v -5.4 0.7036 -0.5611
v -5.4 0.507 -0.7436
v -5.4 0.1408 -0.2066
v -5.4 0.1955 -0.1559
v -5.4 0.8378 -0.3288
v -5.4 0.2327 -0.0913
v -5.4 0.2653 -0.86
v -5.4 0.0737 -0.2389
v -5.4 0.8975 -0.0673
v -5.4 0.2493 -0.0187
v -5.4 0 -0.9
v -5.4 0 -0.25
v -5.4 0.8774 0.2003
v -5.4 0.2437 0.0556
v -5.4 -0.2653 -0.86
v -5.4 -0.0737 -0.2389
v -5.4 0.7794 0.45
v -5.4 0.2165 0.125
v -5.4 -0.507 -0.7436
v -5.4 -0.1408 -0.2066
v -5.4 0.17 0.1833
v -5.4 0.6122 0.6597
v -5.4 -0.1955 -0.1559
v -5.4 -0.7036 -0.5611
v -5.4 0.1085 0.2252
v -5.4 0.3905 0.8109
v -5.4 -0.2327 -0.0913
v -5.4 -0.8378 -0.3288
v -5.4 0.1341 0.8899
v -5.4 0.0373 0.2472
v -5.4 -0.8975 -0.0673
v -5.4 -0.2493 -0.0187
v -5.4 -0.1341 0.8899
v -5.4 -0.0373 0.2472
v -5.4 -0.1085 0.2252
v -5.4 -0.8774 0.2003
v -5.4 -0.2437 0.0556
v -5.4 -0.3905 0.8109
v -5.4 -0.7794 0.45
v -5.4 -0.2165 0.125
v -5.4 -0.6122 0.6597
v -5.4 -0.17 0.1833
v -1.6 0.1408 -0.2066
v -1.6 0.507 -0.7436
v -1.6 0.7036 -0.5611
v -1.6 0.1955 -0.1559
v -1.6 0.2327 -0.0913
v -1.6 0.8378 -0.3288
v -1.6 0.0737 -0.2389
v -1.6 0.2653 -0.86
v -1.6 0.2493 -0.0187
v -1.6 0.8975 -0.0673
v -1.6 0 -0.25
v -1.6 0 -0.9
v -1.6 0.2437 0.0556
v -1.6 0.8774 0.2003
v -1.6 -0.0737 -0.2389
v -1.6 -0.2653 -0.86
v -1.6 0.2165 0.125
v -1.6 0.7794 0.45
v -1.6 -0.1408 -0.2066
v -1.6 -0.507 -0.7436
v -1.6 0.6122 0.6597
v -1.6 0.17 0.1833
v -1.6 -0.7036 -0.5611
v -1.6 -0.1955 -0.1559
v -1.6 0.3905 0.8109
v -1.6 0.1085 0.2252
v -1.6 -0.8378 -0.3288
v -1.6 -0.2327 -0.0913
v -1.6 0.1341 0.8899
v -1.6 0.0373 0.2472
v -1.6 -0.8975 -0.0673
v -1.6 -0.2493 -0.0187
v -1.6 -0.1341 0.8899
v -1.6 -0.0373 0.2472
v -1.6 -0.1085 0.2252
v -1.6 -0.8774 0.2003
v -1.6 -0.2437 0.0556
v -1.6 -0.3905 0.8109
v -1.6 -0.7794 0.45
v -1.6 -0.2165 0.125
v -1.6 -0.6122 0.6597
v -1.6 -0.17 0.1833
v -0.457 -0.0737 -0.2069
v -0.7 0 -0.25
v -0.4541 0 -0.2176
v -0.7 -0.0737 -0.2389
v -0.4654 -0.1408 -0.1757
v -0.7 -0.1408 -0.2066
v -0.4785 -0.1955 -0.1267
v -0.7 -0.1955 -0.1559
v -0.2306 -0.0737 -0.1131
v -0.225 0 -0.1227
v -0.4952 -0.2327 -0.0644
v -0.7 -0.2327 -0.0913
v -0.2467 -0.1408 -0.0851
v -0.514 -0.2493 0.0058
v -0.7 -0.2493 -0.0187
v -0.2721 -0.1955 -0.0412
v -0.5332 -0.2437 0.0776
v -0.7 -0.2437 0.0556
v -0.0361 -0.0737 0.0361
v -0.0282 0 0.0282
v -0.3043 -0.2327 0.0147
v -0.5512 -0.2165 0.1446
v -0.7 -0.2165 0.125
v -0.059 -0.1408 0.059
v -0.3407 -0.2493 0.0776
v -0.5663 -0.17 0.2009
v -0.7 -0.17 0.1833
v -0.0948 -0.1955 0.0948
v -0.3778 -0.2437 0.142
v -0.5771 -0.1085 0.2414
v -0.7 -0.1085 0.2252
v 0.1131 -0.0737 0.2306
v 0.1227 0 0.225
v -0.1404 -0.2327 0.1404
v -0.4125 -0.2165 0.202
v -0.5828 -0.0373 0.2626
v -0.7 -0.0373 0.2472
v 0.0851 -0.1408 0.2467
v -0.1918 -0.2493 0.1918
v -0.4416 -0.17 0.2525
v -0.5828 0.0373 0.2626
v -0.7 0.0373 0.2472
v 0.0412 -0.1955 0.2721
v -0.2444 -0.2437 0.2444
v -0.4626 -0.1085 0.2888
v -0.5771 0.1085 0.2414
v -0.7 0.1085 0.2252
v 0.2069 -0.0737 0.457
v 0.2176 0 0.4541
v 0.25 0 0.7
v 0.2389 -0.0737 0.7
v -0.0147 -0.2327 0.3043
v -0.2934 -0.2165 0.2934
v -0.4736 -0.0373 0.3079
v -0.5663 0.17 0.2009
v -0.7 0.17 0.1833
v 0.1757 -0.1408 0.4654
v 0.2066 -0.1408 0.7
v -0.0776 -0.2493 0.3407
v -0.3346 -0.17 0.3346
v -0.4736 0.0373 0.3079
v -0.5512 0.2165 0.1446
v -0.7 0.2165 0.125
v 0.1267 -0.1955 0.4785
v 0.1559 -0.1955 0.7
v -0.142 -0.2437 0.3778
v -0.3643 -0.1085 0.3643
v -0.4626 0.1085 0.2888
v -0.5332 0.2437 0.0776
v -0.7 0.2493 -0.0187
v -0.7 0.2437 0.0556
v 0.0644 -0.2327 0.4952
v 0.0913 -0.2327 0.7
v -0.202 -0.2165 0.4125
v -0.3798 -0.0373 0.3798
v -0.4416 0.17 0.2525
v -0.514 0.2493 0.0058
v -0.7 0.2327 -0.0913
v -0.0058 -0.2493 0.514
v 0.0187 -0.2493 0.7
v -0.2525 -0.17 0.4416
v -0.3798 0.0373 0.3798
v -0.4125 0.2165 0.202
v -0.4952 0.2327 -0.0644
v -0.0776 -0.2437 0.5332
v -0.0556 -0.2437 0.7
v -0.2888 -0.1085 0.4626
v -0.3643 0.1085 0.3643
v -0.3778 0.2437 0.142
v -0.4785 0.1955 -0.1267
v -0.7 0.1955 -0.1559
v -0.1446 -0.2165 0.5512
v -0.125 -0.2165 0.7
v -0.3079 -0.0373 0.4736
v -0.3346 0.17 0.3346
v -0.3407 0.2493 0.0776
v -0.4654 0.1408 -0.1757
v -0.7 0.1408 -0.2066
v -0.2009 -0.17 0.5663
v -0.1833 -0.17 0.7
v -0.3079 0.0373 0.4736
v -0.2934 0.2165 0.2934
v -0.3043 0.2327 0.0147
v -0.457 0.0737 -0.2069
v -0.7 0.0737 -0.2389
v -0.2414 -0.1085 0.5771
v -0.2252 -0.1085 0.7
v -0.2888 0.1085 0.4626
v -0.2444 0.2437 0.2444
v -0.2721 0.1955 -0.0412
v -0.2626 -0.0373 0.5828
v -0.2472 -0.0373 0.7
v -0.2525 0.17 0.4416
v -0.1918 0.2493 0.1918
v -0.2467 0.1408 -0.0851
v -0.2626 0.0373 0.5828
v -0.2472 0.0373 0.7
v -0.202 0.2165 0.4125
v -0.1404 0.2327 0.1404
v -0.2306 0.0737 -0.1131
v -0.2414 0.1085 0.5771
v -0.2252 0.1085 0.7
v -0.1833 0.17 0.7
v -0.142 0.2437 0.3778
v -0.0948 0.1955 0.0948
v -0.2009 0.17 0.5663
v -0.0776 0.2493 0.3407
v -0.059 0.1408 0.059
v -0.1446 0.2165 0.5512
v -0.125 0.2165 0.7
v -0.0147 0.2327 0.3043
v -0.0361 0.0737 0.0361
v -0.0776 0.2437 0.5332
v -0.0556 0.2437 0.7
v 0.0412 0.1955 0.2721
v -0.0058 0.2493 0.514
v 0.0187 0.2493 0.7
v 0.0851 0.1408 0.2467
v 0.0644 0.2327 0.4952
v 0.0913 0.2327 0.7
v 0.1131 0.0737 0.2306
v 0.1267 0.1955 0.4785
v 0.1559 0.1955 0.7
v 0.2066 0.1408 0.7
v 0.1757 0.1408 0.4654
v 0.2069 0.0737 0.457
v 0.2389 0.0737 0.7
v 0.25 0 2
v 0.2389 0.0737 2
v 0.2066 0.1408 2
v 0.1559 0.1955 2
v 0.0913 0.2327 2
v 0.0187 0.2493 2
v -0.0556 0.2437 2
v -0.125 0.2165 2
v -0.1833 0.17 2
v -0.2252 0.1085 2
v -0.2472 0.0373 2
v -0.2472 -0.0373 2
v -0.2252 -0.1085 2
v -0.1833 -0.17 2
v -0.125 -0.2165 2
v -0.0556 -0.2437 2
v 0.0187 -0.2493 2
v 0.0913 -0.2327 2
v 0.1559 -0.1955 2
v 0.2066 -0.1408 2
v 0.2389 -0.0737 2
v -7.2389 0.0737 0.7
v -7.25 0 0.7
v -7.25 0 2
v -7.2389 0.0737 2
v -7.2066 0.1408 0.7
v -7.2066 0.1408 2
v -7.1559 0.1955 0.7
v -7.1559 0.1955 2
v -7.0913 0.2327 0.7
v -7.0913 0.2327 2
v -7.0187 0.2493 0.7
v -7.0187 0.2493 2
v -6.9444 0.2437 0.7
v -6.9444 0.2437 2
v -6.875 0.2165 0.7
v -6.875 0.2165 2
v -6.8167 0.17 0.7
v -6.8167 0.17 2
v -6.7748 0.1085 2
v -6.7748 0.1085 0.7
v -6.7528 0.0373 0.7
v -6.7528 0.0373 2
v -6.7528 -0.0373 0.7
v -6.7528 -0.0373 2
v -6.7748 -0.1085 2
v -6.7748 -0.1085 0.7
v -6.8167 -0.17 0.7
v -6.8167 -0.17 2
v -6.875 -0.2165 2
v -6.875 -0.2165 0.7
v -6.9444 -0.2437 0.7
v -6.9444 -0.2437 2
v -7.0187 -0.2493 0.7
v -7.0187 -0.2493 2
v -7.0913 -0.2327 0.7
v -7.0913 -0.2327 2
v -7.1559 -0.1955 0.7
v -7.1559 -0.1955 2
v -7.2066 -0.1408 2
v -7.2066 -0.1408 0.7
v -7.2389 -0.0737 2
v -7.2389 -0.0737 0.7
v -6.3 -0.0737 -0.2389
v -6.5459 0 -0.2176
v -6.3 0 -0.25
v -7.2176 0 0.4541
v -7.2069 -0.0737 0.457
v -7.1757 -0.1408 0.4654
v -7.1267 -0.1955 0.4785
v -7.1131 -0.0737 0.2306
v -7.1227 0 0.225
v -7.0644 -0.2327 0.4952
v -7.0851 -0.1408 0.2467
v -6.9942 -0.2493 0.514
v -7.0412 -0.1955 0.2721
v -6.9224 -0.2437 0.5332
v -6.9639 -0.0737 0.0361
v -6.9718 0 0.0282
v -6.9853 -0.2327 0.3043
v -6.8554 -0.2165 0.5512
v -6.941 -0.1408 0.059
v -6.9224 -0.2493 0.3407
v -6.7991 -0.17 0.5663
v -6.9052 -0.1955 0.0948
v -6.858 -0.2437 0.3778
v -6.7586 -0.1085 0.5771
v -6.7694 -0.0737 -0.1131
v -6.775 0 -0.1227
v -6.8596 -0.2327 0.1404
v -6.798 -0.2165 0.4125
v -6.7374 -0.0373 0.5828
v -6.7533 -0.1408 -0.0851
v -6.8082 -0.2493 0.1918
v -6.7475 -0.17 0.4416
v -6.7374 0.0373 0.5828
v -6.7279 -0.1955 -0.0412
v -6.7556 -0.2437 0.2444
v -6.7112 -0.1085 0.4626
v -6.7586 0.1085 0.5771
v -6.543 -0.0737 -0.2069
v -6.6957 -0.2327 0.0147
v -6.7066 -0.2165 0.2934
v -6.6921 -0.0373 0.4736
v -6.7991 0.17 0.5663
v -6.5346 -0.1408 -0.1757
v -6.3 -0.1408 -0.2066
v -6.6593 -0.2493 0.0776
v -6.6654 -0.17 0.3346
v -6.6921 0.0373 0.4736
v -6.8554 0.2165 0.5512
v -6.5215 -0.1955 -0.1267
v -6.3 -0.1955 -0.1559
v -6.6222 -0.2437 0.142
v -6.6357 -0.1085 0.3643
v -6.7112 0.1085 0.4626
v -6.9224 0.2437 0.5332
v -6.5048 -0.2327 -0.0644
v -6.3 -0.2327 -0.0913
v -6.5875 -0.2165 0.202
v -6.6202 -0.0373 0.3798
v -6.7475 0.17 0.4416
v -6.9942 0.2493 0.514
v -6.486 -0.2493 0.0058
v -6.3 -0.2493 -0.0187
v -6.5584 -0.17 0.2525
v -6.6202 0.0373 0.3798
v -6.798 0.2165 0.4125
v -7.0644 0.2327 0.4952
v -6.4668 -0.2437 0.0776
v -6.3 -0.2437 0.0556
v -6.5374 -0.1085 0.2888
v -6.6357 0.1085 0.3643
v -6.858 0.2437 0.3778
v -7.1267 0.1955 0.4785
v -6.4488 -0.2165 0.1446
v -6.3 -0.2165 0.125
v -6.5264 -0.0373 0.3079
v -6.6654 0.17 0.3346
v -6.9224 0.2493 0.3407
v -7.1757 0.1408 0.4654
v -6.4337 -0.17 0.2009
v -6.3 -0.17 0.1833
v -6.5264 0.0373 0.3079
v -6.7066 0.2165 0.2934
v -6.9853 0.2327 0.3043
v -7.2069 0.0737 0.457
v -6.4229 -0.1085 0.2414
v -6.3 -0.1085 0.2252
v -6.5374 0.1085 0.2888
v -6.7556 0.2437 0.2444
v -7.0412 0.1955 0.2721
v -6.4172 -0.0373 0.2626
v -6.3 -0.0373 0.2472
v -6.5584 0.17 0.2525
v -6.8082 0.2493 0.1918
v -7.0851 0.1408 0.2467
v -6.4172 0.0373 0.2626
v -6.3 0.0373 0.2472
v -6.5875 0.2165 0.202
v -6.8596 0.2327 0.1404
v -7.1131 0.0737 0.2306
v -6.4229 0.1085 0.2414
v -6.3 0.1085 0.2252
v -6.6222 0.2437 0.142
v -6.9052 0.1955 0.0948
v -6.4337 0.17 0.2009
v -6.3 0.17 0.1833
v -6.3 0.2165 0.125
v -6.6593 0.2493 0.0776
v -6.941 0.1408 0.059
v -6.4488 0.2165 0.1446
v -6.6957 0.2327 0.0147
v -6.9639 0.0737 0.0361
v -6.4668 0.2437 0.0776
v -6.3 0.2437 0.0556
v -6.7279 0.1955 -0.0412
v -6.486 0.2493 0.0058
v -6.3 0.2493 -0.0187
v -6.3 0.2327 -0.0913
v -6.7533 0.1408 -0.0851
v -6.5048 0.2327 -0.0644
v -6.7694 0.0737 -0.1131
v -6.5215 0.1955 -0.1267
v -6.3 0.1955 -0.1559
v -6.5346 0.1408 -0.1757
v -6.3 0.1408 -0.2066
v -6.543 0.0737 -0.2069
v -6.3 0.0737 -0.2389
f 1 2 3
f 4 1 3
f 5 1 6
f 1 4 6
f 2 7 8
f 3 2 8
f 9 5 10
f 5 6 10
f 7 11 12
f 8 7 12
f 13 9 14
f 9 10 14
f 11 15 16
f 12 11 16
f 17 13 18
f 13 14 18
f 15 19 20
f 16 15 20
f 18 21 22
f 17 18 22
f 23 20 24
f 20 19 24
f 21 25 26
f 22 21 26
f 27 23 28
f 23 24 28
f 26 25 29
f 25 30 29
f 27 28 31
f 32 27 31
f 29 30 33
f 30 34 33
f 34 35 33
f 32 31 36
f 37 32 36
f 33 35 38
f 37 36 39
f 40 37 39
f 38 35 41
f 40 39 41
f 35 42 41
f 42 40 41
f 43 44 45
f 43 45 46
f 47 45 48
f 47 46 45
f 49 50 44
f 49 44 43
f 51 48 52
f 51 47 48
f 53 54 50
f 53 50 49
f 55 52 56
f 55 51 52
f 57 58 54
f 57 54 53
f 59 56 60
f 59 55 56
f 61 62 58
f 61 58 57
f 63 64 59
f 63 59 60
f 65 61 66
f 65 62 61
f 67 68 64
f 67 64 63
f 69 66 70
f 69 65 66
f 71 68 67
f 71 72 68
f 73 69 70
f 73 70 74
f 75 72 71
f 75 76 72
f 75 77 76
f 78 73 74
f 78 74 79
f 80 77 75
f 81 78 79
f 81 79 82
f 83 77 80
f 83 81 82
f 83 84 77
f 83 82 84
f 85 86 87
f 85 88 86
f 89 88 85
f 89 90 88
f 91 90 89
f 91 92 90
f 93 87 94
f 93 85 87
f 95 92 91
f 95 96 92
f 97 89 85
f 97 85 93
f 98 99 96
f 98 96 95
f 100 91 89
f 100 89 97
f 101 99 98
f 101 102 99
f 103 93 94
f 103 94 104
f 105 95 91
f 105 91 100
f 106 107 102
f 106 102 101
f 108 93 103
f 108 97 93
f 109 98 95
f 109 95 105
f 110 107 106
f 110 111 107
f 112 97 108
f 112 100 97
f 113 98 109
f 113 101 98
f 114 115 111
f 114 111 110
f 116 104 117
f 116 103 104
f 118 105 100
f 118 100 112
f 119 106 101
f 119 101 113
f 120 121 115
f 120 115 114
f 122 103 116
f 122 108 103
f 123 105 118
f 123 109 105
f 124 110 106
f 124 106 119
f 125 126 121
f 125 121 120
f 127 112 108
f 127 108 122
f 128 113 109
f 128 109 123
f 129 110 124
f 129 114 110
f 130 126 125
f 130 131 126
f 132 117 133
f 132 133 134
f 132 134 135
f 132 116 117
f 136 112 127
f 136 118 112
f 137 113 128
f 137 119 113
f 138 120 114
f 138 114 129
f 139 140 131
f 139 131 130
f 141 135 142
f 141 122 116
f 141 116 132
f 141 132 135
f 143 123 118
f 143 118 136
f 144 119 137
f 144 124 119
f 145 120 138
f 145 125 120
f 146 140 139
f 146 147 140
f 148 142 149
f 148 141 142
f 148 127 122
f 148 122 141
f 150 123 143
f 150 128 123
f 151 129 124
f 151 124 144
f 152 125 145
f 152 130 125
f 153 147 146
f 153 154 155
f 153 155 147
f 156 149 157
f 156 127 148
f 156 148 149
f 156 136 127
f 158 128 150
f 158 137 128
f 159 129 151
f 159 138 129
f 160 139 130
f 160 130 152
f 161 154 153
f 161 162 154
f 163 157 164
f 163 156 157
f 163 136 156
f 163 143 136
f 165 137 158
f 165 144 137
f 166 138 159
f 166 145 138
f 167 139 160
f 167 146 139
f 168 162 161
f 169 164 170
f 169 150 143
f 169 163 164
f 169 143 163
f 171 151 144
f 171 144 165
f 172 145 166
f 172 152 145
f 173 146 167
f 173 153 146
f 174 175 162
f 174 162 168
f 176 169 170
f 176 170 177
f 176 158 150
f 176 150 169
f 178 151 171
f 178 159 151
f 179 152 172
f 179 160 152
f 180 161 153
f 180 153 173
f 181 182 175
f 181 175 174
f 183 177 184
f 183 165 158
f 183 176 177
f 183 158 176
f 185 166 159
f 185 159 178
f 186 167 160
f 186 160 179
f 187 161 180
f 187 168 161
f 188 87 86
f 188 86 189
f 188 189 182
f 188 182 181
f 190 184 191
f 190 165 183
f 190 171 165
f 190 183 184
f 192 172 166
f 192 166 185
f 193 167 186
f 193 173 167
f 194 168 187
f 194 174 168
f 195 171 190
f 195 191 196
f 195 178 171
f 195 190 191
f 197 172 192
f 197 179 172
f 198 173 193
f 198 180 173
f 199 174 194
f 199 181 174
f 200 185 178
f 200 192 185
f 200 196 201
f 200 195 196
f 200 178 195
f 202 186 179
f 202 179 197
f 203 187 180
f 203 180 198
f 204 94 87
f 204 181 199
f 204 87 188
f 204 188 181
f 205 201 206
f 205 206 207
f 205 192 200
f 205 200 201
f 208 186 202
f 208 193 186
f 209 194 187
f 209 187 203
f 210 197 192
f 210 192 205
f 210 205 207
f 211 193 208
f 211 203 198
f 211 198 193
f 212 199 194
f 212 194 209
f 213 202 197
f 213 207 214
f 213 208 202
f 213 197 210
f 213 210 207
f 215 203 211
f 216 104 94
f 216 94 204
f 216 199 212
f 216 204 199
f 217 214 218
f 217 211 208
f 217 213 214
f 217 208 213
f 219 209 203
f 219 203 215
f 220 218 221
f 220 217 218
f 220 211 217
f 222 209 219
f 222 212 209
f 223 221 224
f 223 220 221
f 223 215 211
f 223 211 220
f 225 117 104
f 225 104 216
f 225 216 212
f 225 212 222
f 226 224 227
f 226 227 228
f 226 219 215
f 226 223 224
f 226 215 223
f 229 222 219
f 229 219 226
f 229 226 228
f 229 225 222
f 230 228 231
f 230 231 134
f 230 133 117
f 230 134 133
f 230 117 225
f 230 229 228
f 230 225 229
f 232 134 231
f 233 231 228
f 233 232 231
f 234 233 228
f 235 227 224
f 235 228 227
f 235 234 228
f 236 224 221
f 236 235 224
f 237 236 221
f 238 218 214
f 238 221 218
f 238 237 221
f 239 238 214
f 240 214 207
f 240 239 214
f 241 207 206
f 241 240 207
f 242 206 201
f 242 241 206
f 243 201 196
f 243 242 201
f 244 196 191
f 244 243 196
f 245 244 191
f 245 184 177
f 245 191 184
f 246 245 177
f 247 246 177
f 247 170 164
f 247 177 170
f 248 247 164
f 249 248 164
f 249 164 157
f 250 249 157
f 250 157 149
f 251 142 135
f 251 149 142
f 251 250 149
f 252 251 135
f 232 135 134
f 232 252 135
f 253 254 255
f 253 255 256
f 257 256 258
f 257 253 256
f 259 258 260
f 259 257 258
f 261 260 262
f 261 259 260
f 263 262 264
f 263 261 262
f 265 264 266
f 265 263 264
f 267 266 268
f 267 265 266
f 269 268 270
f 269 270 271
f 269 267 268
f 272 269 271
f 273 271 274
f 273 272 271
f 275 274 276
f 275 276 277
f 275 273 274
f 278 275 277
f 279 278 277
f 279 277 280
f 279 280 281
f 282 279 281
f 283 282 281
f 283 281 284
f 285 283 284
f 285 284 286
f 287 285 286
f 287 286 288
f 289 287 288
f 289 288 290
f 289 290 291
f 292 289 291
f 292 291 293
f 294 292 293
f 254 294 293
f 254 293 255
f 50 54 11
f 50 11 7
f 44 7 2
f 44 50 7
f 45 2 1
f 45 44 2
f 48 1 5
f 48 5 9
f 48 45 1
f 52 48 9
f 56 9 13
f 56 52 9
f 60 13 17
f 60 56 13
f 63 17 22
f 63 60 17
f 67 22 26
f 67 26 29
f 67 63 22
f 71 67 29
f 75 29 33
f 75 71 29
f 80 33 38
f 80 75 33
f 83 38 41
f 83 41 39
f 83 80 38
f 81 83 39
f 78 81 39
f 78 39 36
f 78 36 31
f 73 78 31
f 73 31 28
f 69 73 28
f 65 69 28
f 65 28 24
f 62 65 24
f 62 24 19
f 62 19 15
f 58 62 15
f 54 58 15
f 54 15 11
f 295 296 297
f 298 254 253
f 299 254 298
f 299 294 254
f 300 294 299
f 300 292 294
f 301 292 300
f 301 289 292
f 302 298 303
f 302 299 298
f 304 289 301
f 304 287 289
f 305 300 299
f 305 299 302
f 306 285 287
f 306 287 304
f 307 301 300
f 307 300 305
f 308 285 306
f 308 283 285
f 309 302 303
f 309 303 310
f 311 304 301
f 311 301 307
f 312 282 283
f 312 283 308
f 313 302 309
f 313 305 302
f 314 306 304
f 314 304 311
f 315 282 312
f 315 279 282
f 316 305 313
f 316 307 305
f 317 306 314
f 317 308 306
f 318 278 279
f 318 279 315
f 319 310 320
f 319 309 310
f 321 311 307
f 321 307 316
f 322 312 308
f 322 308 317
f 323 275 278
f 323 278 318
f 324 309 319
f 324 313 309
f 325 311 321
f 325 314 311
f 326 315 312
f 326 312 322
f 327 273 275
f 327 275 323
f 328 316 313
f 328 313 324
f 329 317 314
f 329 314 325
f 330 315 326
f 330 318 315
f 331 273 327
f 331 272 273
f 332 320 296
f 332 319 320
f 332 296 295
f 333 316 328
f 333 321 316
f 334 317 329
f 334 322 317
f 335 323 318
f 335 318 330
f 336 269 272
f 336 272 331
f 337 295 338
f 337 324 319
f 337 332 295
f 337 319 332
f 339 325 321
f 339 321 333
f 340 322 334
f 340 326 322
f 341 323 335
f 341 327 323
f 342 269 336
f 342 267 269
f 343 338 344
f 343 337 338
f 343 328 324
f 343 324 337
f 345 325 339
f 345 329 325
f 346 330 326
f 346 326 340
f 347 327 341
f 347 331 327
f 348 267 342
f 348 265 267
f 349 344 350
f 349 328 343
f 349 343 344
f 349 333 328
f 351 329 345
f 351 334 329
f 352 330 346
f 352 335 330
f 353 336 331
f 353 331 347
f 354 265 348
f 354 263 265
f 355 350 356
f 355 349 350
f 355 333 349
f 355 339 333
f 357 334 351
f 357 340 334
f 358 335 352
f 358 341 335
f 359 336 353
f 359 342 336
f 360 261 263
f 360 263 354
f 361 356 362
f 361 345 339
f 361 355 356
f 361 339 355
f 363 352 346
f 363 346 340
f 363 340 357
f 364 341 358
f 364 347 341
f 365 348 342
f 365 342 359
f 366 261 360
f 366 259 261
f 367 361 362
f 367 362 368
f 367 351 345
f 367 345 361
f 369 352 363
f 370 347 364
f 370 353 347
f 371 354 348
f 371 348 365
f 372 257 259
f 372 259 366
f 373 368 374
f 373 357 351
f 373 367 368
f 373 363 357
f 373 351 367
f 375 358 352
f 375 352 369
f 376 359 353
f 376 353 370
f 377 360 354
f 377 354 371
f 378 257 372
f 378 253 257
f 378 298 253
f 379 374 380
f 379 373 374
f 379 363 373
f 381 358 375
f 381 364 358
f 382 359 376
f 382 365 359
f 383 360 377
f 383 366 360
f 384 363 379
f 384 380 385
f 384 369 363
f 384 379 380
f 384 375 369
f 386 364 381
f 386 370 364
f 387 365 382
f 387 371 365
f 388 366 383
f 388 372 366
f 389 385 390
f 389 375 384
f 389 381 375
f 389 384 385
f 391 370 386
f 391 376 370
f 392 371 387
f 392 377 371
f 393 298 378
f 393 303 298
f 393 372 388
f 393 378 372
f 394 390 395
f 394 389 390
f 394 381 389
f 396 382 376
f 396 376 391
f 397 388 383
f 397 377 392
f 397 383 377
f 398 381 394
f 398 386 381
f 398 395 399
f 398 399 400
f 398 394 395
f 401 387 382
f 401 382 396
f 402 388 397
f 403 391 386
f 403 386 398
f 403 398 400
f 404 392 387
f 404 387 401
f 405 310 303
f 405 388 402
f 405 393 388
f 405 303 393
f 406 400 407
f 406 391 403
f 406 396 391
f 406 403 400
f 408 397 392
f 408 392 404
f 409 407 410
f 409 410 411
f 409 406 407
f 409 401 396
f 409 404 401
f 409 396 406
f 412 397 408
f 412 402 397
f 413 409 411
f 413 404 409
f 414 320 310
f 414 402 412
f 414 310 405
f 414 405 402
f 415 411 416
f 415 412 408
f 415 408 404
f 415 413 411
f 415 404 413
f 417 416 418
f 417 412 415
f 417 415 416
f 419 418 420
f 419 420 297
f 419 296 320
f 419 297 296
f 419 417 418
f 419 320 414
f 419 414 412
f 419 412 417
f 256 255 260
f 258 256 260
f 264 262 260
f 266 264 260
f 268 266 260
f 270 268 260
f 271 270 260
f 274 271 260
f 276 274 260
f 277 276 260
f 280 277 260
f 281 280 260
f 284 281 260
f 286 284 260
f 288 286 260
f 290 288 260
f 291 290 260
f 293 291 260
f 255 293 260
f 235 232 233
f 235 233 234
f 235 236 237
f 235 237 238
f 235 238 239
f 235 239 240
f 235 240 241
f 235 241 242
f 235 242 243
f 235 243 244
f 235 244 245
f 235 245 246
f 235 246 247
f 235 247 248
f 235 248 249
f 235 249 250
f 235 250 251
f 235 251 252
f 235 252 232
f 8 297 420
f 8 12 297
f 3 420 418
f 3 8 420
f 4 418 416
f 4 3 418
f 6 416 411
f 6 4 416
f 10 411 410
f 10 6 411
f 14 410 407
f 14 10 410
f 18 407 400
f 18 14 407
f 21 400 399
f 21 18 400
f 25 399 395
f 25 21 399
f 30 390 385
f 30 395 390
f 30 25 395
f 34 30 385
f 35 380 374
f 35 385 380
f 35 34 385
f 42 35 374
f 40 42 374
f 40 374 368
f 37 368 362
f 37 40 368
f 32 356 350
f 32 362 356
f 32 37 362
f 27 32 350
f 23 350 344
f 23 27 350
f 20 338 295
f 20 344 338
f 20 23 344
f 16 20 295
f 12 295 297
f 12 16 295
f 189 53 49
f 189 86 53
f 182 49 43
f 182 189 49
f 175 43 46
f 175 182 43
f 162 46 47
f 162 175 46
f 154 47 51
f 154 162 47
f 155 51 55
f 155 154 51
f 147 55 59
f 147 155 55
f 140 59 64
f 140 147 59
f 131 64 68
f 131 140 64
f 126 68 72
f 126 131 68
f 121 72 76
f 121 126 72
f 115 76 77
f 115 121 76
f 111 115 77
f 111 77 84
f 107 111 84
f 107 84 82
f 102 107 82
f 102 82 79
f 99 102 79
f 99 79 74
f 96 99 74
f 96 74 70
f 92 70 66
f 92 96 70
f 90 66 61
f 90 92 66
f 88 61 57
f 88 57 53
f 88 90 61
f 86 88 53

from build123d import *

# Parameters (mm, degrees)
SKETCH_2_R = 0.25
SKETCH_7_R = 0.9


with BuildPart() as part:
    # По траектории1: sweep along a path in Эскиз1
    with BuildLine(Plane(origin=(0, 0, 0), x_dir=(1, 0, 0), z_dir=(0, 1, 0))) as sweep_1_path:
        Line((-7, -2), (-7, -0.7))
        ThreePointArc((-7, -0.7), (-6.794974747, -0.205025253), (-6.3, 0))
        Line((-6.3, 0), (-0.7, 0))
        ThreePointArc((-0.7, 0), (-0.205025253, -0.205025253), (0, -0.7))
        Line((0, -0.7), (0, -2))
    # Эскиз2 → По траектории1 (sweep)
    with BuildSketch(Plane.XY.offset(2)):
        Circle(SKETCH_2_R)
    sweep(path=sweep_1_path.line)

    # По траектории2: sweep along a path in Эскиз6
    with BuildLine(Plane(origin=(0, 0, 0), x_dir=(1, 0, 0), z_dir=(0, 1, 0))) as sweep_2_path:
        Line((-5.4, 0), (-3.5, 0))
        Line((-3.5, 0), (-1.6, 0))
    # Эскиз7 → По траектории2 (sweep)
    with BuildSketch(Plane(origin=(-5.4, 0, 0), x_dir=(0, 0, -1), z_dir=(1, 0, 0))):
        Circle(SKETCH_7_R)
    sweep(path=sweep_2_path.line)


solid = part.part
